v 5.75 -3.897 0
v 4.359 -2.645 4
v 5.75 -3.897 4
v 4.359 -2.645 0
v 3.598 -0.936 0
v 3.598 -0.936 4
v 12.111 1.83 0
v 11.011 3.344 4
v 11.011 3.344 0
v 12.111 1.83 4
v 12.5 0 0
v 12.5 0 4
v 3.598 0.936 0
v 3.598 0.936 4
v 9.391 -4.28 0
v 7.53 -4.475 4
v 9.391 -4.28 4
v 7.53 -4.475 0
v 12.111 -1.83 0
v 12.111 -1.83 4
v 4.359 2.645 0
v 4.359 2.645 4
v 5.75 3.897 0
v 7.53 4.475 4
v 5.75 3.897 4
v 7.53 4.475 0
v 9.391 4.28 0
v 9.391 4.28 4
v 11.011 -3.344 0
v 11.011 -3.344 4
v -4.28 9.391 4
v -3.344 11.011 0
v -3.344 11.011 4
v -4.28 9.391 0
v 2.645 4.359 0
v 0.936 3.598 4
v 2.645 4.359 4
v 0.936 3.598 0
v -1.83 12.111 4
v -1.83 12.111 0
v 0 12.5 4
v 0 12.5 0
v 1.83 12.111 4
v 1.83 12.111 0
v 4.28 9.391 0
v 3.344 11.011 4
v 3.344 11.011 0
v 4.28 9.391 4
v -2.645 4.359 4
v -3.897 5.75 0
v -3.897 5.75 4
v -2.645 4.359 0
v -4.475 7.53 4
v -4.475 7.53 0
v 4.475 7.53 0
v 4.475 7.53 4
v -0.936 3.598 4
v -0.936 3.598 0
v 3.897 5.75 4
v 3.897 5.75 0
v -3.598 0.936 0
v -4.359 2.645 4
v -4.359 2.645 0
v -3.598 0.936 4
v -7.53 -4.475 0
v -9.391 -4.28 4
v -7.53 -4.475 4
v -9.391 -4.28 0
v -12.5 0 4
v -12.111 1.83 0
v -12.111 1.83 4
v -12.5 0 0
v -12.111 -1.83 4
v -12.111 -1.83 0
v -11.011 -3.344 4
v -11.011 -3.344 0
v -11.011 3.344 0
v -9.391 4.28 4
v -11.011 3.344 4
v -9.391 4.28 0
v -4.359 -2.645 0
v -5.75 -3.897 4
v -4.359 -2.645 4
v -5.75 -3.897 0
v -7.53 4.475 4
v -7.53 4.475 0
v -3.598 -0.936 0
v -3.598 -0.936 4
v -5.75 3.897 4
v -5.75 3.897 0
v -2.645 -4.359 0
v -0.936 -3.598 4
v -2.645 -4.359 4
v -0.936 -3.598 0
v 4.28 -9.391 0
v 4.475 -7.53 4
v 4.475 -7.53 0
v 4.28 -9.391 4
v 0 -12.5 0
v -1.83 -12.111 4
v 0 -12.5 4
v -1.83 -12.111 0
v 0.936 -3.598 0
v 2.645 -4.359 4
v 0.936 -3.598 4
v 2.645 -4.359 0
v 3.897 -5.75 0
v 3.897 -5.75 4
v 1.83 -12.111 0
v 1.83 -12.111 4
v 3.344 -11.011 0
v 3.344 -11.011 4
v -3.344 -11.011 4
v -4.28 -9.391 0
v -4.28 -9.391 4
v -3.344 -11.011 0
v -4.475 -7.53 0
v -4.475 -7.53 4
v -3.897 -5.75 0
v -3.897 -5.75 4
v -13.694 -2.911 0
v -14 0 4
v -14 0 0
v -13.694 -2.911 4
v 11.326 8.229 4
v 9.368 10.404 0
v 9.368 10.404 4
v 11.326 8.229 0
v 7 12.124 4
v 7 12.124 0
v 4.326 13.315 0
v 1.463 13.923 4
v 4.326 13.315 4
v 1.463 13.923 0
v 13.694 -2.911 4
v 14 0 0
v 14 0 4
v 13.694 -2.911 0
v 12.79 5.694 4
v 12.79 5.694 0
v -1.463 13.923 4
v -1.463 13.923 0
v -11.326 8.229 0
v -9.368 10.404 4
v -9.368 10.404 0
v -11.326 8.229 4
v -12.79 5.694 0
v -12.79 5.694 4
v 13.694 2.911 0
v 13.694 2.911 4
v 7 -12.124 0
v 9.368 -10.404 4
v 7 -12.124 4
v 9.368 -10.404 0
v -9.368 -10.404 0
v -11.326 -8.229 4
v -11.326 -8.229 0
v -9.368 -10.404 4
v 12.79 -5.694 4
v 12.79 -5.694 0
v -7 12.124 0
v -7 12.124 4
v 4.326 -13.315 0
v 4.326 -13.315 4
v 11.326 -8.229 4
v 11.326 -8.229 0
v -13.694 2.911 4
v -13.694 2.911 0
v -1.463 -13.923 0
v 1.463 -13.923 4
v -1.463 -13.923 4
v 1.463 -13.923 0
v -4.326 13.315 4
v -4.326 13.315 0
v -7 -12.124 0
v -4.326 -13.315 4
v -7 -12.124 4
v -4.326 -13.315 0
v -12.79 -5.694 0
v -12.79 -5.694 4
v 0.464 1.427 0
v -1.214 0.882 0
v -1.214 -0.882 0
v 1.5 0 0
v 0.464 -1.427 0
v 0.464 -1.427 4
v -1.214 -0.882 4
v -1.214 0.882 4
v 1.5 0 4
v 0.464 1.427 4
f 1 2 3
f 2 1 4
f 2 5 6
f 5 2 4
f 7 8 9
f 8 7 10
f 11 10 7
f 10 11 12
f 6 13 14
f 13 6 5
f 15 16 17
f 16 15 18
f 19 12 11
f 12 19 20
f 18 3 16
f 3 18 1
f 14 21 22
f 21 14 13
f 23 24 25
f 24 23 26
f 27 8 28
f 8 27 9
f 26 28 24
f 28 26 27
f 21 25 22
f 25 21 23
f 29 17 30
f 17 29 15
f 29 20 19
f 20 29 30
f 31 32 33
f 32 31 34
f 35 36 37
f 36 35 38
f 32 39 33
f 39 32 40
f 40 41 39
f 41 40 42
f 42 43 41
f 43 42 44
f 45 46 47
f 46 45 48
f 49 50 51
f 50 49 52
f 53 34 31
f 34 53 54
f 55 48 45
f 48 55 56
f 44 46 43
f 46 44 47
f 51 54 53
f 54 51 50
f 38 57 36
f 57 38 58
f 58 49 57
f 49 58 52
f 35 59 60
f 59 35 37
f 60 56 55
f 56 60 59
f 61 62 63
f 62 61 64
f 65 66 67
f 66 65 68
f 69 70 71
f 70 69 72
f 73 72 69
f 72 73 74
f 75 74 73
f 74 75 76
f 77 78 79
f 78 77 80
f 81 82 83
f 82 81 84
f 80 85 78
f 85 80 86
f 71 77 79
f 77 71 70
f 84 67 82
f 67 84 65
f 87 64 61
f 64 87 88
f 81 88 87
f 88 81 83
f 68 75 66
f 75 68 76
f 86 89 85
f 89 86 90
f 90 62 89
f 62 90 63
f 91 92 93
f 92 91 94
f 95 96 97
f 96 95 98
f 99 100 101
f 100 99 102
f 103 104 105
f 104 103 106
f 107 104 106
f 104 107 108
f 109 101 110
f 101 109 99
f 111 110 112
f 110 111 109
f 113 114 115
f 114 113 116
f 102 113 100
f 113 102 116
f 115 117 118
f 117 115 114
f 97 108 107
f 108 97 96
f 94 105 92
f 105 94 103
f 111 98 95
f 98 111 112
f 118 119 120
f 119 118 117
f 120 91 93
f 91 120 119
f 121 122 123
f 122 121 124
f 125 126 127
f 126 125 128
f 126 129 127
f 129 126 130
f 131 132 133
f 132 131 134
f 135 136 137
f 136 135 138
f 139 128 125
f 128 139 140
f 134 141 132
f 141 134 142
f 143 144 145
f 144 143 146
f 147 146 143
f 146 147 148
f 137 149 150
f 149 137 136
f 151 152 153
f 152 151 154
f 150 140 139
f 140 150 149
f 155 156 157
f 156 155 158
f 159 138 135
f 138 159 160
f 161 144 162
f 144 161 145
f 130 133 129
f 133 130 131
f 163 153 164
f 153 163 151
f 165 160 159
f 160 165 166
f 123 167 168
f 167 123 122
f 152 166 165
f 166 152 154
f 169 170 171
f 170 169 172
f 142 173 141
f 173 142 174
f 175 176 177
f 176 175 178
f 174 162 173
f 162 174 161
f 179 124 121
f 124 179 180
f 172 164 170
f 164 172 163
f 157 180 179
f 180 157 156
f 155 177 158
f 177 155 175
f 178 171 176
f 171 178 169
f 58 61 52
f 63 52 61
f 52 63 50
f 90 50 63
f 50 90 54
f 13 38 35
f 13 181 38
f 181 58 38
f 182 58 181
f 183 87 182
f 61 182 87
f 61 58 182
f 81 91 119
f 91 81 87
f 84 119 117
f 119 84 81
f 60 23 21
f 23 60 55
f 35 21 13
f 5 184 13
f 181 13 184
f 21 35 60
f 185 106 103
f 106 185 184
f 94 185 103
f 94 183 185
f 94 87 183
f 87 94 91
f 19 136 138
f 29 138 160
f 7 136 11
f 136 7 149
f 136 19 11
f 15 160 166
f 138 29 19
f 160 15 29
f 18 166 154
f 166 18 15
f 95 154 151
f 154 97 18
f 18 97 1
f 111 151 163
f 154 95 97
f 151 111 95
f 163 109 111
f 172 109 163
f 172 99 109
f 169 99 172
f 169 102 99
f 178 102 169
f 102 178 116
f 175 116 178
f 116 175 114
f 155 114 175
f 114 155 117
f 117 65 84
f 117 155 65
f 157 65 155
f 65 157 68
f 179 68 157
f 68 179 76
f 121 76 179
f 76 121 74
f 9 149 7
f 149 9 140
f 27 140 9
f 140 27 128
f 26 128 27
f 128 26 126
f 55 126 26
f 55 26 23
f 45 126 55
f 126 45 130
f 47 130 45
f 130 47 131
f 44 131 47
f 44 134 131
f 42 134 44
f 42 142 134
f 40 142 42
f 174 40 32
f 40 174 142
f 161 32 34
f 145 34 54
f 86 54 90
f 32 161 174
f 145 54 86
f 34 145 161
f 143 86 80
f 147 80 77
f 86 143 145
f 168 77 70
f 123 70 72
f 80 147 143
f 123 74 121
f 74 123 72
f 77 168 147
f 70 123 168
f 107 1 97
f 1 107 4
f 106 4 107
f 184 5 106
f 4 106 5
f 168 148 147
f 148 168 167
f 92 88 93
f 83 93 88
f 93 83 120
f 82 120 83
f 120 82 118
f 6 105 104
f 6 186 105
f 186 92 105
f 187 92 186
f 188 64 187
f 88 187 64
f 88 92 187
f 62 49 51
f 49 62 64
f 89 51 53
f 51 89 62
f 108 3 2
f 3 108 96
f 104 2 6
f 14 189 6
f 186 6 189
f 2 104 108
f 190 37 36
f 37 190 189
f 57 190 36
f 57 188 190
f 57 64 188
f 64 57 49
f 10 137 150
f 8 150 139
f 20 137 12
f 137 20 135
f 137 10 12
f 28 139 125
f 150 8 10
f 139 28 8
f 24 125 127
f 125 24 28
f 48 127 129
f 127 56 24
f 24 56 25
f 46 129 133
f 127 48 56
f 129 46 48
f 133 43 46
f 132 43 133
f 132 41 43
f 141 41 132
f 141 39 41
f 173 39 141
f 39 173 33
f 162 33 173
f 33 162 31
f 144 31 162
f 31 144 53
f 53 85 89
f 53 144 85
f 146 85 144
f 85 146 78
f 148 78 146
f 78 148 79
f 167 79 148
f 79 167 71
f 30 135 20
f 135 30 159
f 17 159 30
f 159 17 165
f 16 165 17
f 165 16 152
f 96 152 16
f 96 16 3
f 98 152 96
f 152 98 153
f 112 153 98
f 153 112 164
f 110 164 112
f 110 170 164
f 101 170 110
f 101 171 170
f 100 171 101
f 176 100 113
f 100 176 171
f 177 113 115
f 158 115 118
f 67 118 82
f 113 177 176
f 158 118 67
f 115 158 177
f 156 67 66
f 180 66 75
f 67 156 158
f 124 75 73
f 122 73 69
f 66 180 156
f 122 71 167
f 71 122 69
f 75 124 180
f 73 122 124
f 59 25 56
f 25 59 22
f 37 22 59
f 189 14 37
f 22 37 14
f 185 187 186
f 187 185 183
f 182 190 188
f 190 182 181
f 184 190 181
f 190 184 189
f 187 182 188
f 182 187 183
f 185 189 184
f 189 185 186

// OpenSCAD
// file: ../lib/wheel.scad
module wheel(big_holes=true) {
    difference() {
        cylinder(h=4, r=14);
        if (big_holes) {
            for (i=[0:1:4]) {
                rotate([0,0,90*i])
                translate([8,0,-0.01])
                cylinder(h=4.02, r=4.5);
            }
        } else {
            for (i=[0:1:9]) {
                rotate([0,0,45*i])
                translate([10.7,0,-0.01])
                cylinder(h=4.02, r=2);
            }
        }
    }
}
// main file
include <../lib/wheel.scad>

module freeWheel() {
    difference() {
        wheel();
        
        translate([0,0,-0.01])
        cylinder(h=4.02, r=1.5);
        
    }
}

freeWheel();
